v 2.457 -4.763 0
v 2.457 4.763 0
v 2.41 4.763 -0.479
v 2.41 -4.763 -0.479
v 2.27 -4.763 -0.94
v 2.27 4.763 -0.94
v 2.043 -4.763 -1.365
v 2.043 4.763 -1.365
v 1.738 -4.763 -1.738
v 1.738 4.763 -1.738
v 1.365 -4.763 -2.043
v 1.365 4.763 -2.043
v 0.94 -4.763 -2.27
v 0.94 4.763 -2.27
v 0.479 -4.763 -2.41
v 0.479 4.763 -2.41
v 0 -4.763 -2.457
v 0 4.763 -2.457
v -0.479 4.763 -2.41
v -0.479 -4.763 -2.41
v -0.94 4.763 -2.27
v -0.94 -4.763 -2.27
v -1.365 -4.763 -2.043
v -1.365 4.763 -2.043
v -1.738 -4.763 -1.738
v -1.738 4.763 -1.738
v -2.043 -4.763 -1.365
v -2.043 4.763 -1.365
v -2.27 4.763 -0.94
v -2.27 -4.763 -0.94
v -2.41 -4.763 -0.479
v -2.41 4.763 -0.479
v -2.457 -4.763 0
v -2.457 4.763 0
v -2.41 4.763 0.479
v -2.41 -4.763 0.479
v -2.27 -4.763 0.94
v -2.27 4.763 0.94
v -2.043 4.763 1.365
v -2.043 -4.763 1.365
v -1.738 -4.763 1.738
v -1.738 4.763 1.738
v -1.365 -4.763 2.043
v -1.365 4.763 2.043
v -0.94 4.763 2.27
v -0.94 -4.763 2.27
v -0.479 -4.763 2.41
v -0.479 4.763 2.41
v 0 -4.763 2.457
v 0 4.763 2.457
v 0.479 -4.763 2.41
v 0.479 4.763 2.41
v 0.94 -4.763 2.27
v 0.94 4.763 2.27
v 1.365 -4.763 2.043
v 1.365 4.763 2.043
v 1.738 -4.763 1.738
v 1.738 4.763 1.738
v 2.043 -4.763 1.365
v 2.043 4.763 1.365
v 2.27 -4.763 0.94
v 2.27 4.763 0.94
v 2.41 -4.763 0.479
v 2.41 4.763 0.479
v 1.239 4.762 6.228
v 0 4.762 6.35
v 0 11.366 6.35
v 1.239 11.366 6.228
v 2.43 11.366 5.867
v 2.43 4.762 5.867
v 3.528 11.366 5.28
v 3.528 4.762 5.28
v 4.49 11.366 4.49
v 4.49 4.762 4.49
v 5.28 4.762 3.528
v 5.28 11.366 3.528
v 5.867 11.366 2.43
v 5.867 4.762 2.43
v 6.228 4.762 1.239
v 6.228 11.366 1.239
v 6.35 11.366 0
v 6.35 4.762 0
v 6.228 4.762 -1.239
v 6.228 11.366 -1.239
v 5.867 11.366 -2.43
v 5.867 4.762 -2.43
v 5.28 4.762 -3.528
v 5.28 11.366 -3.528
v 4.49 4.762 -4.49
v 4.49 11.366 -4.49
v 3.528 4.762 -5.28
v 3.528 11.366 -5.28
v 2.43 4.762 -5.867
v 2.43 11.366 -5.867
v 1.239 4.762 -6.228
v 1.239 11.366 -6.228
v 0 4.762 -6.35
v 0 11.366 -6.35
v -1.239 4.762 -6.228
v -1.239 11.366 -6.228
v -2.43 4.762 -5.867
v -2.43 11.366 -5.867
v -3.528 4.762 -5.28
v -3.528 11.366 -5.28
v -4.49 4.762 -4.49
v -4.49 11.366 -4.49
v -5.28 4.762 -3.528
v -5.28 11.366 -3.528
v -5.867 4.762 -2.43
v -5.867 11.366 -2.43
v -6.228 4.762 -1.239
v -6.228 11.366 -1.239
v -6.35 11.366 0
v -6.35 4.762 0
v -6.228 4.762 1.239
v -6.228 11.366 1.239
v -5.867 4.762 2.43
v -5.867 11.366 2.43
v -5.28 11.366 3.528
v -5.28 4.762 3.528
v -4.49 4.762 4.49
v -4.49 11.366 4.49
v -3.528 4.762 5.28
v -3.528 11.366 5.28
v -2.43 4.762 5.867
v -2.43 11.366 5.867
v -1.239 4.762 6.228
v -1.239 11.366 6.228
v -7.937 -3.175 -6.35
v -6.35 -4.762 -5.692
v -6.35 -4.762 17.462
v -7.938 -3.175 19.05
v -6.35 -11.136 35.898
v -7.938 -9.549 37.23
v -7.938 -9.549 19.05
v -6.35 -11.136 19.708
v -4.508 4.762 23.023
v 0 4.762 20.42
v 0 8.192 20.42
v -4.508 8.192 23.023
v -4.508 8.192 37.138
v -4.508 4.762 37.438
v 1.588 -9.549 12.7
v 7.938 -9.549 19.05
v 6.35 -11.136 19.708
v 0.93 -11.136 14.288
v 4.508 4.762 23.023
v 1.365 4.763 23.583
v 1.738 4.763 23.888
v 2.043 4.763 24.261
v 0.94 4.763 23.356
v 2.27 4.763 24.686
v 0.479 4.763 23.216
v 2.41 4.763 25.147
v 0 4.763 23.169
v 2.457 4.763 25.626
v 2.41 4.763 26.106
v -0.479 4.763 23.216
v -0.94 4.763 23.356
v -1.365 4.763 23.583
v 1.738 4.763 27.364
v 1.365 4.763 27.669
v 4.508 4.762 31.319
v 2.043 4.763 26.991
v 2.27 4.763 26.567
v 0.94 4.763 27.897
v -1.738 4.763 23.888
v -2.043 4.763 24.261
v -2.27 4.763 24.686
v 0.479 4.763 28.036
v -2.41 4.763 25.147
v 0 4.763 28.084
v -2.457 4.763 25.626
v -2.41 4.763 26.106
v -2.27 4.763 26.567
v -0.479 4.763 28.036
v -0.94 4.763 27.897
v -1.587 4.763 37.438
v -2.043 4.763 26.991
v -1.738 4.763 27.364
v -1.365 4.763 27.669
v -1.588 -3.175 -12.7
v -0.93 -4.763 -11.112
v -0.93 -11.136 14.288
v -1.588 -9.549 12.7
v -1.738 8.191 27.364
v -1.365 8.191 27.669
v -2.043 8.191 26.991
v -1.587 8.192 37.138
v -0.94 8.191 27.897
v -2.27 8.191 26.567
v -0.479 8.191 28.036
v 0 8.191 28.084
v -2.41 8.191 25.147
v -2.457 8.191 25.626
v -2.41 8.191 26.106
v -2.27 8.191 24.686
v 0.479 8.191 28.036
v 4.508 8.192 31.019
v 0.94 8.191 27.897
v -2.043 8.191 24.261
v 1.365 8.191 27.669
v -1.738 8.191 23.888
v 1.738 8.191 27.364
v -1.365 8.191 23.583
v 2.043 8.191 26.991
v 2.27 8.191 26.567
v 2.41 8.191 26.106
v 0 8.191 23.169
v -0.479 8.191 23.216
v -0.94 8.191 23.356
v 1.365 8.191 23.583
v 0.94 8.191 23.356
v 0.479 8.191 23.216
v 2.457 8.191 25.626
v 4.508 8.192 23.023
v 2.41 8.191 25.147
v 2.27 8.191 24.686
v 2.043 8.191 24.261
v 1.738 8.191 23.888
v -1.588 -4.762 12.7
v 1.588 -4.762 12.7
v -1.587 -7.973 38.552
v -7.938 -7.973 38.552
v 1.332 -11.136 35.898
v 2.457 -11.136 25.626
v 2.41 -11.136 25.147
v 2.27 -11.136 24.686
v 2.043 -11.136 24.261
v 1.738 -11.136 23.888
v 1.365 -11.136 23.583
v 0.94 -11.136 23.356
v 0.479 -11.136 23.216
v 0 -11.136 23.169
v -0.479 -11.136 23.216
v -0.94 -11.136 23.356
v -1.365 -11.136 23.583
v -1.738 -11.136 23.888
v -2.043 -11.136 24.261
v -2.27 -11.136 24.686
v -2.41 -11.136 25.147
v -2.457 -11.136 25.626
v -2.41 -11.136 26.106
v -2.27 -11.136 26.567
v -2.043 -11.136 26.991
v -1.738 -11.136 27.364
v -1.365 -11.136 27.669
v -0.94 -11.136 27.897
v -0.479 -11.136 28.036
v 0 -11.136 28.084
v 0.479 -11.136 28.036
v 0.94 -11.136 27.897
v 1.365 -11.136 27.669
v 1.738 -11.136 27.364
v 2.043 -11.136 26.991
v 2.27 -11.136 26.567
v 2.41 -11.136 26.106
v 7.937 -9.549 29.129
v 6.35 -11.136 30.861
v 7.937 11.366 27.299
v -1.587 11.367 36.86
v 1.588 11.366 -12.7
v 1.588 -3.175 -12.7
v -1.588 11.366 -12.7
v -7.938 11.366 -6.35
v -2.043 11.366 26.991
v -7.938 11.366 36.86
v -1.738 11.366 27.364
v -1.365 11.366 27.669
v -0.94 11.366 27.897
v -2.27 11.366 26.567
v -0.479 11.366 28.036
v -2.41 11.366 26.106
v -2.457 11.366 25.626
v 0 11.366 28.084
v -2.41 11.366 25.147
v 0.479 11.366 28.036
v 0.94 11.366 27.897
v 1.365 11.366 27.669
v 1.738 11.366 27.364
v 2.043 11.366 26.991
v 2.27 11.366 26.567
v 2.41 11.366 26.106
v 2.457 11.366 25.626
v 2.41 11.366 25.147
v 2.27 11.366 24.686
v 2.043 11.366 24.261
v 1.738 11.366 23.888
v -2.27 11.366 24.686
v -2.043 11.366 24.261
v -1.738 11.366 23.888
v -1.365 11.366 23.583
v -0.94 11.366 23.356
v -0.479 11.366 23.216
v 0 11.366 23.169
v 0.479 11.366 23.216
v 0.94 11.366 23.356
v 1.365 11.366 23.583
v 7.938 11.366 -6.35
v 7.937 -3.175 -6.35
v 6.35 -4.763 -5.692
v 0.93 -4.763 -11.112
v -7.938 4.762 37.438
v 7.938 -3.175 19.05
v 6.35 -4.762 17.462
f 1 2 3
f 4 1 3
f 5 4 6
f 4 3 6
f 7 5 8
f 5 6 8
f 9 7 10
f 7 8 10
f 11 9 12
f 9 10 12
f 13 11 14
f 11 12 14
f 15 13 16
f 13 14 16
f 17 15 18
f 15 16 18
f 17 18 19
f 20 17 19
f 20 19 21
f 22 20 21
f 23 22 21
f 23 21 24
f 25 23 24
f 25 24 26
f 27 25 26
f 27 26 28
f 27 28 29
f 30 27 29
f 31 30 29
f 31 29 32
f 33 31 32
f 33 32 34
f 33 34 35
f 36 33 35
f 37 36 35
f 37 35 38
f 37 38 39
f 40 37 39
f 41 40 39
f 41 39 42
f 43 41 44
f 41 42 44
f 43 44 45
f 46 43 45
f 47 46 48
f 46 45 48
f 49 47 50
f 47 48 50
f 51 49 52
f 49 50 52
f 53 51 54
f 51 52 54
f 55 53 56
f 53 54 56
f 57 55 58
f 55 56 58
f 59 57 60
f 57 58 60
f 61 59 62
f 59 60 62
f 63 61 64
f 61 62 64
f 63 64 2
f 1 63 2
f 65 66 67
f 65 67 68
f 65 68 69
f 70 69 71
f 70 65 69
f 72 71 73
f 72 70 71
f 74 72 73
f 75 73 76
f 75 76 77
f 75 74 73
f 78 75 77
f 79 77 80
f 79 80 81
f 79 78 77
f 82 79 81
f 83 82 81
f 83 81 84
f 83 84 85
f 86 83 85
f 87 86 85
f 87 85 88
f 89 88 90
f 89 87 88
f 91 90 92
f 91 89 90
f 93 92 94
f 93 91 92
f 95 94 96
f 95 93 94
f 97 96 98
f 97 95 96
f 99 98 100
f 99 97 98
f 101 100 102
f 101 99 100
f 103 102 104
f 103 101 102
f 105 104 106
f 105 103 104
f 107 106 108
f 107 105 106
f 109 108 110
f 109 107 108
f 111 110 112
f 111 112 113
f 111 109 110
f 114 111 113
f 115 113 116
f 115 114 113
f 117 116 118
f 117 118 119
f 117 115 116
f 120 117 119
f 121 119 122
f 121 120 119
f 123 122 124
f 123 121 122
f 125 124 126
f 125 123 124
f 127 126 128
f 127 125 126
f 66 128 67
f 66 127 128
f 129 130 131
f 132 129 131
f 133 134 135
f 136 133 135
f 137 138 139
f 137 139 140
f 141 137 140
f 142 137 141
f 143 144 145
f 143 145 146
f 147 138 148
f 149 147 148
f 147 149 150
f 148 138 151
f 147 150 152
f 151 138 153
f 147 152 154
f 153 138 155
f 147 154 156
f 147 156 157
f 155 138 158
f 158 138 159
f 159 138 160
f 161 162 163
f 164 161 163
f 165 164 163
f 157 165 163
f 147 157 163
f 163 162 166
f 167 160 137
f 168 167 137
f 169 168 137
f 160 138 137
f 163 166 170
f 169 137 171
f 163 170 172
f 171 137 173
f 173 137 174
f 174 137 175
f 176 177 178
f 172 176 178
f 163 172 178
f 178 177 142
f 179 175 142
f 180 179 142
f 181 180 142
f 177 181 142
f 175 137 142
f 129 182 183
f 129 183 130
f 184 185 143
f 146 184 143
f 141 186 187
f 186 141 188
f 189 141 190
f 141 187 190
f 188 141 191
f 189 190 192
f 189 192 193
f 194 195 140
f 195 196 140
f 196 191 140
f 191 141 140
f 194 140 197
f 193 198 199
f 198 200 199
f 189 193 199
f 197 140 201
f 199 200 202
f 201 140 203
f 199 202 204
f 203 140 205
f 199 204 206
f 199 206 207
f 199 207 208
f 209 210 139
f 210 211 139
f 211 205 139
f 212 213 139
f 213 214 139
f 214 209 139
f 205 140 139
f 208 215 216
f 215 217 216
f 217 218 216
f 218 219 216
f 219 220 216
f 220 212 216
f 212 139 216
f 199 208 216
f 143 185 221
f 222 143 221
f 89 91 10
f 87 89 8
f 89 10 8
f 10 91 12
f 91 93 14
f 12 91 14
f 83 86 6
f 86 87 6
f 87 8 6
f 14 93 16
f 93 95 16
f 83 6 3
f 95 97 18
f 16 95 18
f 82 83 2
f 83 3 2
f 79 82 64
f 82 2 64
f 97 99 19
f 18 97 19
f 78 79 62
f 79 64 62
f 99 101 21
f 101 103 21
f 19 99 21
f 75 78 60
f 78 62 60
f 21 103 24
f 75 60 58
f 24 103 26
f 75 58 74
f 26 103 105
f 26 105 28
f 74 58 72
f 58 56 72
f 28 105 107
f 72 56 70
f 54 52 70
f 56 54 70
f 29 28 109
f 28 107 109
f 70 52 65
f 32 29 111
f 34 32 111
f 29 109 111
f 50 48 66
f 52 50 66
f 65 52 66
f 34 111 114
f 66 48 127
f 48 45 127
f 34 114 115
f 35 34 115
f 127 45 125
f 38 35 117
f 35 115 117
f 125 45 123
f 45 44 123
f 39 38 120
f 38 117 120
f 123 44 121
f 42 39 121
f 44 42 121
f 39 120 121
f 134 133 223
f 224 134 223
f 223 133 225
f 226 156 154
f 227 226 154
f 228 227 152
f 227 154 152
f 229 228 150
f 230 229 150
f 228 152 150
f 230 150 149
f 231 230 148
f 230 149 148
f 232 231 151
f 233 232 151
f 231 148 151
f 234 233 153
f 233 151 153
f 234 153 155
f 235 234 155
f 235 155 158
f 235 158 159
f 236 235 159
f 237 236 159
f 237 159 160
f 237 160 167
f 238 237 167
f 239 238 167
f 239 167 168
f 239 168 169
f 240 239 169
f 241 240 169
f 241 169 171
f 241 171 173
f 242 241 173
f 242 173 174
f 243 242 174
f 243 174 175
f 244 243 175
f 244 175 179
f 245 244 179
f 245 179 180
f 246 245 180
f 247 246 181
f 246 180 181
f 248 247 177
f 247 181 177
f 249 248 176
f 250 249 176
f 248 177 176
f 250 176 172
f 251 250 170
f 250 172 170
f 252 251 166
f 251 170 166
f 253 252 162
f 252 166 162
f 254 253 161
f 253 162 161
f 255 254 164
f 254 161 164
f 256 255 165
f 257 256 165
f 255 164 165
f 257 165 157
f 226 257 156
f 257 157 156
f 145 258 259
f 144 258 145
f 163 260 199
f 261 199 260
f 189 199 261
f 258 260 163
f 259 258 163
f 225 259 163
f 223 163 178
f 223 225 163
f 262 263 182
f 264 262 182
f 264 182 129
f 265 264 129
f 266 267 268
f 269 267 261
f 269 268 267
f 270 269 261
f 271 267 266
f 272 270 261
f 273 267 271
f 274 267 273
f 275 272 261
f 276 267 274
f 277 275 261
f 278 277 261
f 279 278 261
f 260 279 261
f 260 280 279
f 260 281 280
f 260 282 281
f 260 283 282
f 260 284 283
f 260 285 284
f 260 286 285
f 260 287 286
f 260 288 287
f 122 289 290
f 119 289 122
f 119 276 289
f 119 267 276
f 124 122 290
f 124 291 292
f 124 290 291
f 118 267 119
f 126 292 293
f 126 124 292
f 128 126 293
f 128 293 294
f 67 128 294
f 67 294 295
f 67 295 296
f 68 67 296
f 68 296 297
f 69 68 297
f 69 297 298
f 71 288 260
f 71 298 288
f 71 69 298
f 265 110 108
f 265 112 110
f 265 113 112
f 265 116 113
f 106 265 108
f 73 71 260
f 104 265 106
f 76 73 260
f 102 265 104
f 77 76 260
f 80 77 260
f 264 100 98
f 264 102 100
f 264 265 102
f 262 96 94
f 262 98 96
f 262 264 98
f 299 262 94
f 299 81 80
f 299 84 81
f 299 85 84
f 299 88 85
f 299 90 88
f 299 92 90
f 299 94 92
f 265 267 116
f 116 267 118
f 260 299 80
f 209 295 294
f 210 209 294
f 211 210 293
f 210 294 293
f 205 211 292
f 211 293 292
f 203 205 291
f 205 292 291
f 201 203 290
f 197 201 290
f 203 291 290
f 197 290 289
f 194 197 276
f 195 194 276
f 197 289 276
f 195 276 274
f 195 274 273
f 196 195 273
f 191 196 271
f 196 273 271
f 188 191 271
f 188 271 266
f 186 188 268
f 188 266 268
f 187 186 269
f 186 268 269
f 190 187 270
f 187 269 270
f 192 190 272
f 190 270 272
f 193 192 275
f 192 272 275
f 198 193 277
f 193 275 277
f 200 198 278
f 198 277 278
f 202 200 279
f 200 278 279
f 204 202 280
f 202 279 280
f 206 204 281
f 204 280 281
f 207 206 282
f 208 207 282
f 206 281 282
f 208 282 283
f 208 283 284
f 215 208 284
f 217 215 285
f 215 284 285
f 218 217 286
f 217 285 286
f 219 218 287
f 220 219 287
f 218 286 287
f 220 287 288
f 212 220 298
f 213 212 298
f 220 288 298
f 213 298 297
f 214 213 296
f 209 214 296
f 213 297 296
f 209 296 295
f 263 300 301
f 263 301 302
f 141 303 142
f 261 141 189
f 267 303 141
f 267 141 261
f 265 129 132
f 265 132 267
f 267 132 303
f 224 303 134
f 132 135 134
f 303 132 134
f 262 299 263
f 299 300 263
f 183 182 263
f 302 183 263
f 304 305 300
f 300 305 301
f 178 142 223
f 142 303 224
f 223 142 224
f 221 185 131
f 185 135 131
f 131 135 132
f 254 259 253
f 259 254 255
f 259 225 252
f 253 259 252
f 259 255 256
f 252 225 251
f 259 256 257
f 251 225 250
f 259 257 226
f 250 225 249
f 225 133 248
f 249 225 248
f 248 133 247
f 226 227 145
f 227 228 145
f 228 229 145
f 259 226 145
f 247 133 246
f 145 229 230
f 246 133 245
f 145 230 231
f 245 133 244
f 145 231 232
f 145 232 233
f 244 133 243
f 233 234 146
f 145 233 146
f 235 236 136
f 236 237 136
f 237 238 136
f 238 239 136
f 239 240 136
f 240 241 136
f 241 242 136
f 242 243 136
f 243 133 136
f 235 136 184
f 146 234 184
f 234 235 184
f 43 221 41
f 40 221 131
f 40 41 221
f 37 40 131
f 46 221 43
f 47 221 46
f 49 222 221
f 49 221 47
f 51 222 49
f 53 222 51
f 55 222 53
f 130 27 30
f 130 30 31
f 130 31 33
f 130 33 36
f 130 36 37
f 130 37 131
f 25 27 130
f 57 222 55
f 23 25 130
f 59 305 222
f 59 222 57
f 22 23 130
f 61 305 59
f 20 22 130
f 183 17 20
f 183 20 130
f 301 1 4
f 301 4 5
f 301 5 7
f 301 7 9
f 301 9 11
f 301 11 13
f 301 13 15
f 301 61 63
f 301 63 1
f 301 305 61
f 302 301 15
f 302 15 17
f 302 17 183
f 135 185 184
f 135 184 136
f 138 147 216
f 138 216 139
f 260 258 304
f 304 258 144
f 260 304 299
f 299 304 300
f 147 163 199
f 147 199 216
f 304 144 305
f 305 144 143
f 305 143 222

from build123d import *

# Parameters (mm, degrees)
SKETCH1_W             = 25.4
SKETCH1_H             = 9.525
BOSS_EXTRUDE1_DEPTH   = 7.9375
BOSS_EXTRUDE2_DEPTH   = 15.875
CHAMFER1_SIZE         = 6.35
CHAMFER2_SIZE         = 3.175
CHAMFER2_SIZE2        = 2.93072295
F_8_CLEARANCE_HOLE1_D = 4.9149
CHAMFER3_SIZE         = 1.5875
BOSS_EXTRUDE3_DEPTH   = 3.429
BOSS_EXTRUDE4_START   = 3.175
SKETCH6_W             = 15.875
SKETCH6_H             = 20.446862299
SKETCH6_R             = 2.45745
BOSS_EXTRUDE4_DEPTH   = 3.175
SKETCH7_R             = 6.35
BOSS_EXTRUDE5_DEPTH   = 6.604
CUT_EXTRUDE1_DEPTH    = 44.214477453
CHAMFER5_SIZE         = 9.525


with BuildPart() as part:
    # Sketch1 → Boss-Extrude1 (new, symmetric)
    with BuildSketch(Plane(origin=(0, 0, 0), x_dir=(0, 0, -1), z_dir=(1, 0, 0))):
        Rectangle(SKETCH1_W, SKETCH1_H)
    extrude(amount=BOSS_EXTRUDE1_DEPTH, both=True)

    # Sketch2 → Boss-Extrude2 (add, through all)
    with BuildSketch(Plane.ZY.offset(7.9375)):
        Polygon((12.7, 4.7625), (37.438033761, 4.7625), (38.828997162, -11.13628443), (12.7, -11.13628443), align=None)
    extrude(amount=-BOSS_EXTRUDE2_DEPTH)

    # Chamfer1
    chamfer1_edges = [part.edges().sort_by_distance(p)[0] for p in [
        (7.9375, 0, -12.7),
        (7.9375, -7.949392215, 12.7),
        (-7.9375, -7.949392215, 12.7),
        (-7.9375, 0, -12.7),
    ]]
    chamfer(chamfer1_edges, length=CHAMFER1_SIZE)

    # Chamfer2
    chamfer2_edges = [part.edges().sort_by_distance(p)[0] for p in [
        (0, -11.13628443, 38.828997162),
    ]]
    chamfer2_side = [part.faces().sort_by_distance(p)[0] for p in [
        (0, -3.186892215, 38.133515462),
    ]]
    chamfer(chamfer2_edges, length=CHAMFER2_SIZE, length2=CHAMFER2_SIZE2, reference=chamfer2_side[0])

    # #8 Clearance Hole1 (through all)
    with Locations(Plane(origin=(0, -11.13628443, 0), x_dir=(-1, 0, 0), z_dir=(0, -1, 0))):
        with Locations((0, -25.62613884), (0, 0)):
            Hole(F_8_CLEARANCE_HOLE1_D / 2)

    # Chamfer3
    chamfer3_edges = [part.edges().sort_by_distance(p)[0] for p in [
        (0, -11.13628443, 12.7),
        (-7.9375, -11.13628443, 27.474137106),
        (7.9375, -11.13628443, 27.474137106),
        (-4.7625, -11.13628443, 15.875),
        (4.7625, -11.13628443, 15.875),
        (0, -4.7625, -12.7),
        (-4.7625, -4.7625, -9.525),
        (4.7625, -4.7625, -9.525),
        (-7.9375, -4.7625, 6.35),
        (7.9375, -4.7625, 6.35),
    ]]
    chamfer(chamfer3_edges, length=CHAMFER3_SIZE)

    # Sketch5 → Boss-Extrude3 (add)
    with BuildSketch(Plane(origin=(0, 4.7625, 0), x_dir=(1, 0, 0), z_dir=(0, 1, 0))):
        Polygon((4.5085, -37.438033761), (4.5085, -23.023155151), (0, -20.420171462), (-4.5085, -23.023155151), (-4.5085, -37.438033761), (-7.9375, -37.438033761), (-7.9375, -16.991171462), (7.9375, -16.991171462), (7.9375, -37.438033761), align=None)
    extrude(amount=BOSS_EXTRUDE3_DEPTH)

    # Sketch6 → Boss-Extrude4 (add)
    with BuildSketch(Plane(origin=(0, 8.1915, 0), x_dir=(1, 0, 0), z_dir=(0, 1, 0)).offset(BOSS_EXTRUDE4_START)):
        with Locations((0, -27.214602611)):
            Rectangle(SKETCH6_W, SKETCH6_H)
        with Locations(Location((0, -25.62613884, 0), (0, 0, 90))):
            Circle(SKETCH6_R, mode=Mode.SUBTRACT)
    extrude(amount=-BOSS_EXTRUDE4_DEPTH)

    # Sketch7 → Boss-Extrude5 (add)
    with BuildSketch(Plane(origin=(0, 4.7625, 0), x_dir=(1, 0, 0), z_dir=(0, 1, 0))):
        Polygon((-7.9375, 6.35), (-7.9375, -16.991171462), (7.9375, -16.991171462), (7.9375, 6.35), (1.5875, 12.7), (-1.5875, 12.7), align=None)
        with Locations(Location((0, 0, 0), (0, 0, 270))):
            Circle(SKETCH7_R, mode=Mode.SUBTRACT)
    extrude(amount=BOSS_EXTRUDE5_DEPTH)

    # Sketch8 → Cut-Extrude1 (cut, through all)
    with BuildSketch(Plane.ZY.offset(7.9375)):
        Polygon((37.438033761, 4.7625), (36.860258627, 11.3665), (37.438033761, 11.3665), align=None)
    extrude(amount=-CUT_EXTRUDE1_DEPTH, mode=Mode.SUBTRACT)

    # Chamfer5
    # the kernel refuses this chamfer: 9.525 mm, written as the material it takes off along each edge
    with BuildSketch(Plane(origin=(7.9375, -32.375434787, 40.687182042), x_dir=(0.027495876610586376, -0.08712279063518516, -0.9958180537233462), z_dir=(0, 0.9961946980917505, -0.0871557427476014))) as chamfer5_piece_1:
        Polygon((CHAMFER5_SIZE * 0.999621916911, CHAMFER5_SIZE * 0.0274958766106), (-CHAMFER5_SIZE * 0.0274958766106, CHAMFER5_SIZE * 0.999621916911), (0, 0), align=None)
    extrude(amount=68.404302332, mode=Mode.SUBTRACT)


solid = part.part
